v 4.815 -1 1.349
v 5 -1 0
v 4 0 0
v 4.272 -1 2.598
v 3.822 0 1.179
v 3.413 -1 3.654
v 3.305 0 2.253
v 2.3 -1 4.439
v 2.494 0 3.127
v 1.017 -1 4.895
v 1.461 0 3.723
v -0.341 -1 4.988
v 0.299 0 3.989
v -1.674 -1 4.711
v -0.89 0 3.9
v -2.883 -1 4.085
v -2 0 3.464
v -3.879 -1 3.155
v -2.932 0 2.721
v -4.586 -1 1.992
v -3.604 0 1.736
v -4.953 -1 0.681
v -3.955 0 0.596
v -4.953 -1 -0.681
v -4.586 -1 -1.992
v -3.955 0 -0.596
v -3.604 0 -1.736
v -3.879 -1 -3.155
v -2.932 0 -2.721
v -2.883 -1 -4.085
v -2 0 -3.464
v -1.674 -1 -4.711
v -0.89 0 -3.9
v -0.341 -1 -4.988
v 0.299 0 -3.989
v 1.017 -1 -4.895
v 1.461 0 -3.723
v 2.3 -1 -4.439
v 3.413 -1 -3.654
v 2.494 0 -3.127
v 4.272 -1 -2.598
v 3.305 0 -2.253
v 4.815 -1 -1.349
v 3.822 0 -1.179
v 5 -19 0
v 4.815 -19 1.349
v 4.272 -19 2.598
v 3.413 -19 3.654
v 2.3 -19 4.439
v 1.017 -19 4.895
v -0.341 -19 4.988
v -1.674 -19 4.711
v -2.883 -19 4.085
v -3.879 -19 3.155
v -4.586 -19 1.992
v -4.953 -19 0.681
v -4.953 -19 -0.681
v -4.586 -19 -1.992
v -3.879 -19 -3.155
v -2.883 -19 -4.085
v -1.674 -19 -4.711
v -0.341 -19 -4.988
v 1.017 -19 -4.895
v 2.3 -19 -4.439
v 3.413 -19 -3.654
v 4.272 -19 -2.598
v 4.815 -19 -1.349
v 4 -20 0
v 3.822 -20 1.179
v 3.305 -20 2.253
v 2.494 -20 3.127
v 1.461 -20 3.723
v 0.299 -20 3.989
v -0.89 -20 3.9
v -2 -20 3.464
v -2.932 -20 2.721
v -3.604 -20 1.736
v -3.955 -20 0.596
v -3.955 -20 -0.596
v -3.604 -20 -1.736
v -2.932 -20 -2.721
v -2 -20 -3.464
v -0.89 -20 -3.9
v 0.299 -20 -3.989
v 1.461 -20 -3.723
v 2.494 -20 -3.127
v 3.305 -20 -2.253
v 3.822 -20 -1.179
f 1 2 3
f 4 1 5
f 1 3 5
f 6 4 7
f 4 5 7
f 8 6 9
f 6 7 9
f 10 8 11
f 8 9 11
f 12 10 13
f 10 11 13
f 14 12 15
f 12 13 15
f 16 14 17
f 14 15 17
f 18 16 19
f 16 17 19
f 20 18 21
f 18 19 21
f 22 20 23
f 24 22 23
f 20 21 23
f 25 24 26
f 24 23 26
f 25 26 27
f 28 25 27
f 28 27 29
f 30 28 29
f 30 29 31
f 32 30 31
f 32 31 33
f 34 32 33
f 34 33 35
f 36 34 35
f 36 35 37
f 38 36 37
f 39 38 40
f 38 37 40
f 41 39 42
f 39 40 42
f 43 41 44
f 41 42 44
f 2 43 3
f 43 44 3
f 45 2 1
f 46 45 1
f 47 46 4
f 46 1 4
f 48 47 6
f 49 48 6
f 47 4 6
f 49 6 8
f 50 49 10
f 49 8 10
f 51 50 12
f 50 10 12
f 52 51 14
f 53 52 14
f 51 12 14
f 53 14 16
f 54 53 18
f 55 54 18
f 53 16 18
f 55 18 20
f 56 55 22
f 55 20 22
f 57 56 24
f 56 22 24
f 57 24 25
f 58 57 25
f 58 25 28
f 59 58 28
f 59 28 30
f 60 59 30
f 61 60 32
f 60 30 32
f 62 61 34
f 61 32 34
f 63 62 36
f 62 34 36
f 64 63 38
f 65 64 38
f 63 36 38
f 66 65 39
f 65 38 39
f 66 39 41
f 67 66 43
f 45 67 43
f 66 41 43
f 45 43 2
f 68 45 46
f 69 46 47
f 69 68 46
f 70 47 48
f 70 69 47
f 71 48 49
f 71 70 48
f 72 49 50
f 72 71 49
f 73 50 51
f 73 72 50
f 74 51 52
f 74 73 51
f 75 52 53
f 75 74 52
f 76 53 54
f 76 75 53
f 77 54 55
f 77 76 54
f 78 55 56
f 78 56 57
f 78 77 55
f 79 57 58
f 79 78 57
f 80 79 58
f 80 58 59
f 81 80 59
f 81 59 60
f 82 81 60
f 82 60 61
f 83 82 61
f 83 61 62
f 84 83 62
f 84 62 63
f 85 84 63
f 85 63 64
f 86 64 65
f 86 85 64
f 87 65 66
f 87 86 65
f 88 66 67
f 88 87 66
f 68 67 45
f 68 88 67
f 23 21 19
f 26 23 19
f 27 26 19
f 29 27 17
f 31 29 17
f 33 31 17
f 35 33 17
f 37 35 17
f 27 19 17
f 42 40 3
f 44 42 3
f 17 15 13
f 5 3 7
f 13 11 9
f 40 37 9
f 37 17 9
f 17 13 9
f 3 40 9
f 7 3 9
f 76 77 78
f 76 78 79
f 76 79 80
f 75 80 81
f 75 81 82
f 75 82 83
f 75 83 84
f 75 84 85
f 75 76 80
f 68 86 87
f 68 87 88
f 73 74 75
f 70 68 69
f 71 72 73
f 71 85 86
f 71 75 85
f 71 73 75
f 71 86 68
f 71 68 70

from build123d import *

# Parameters (mm, degrees)
F0_R     = 5
F1_DEPTH = 20
F2_SIZE  = 1
F3_SIZE  = 1


with BuildPart() as f1:
    # F0 (on Front) → F1 (new body)
    with BuildSketch(Plane.XZ):
        Circle(F0_R)
    extrude(amount=F1_DEPTH)

    # F2
    f2_edges = [f1.edges().sort_by_distance(p)[0] for p in [
        (-5, 0, 0),
    ]]
    chamfer(f2_edges, length=F2_SIZE)

    # F3
    f3_edges = [f1.edges().sort_by_distance(p)[0] for p in [
        (-5, -20, 0),
    ]]
    chamfer(f3_edges, length=F3_SIZE)


solid = f1.part
